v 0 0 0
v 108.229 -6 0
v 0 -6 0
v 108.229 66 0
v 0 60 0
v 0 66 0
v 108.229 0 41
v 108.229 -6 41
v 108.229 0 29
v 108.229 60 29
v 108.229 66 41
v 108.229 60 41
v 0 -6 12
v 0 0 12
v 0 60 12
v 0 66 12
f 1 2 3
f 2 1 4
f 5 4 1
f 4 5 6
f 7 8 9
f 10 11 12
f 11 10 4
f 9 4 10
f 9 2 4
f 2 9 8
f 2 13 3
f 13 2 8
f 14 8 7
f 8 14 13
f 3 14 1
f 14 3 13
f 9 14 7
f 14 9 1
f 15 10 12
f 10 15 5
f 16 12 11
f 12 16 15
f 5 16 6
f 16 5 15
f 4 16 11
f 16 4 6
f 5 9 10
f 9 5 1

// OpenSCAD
// file: rail_spec.scad
// ===== 레일 플랫폼 방식 공용 파라미터 =====
// 핵심 개념: 침대를 들지 않고 굴려서 올라가는 2개의 계량 레일.
//   각 레일 = 알루미늄 프로파일 빔 + 양 끝단 아래 로드셀 2개
//   침대 좌/우 바퀴가 각각 레일 위를 굴러 들어가 크래들에 안착.
//   총 로드셀 4개 = 좌레일 앞/뒤 + 우레일 앞/뒤
//   총중량 = 4개 합 / 무게중심 = 모멘트 계산

// --- 로드셀 CAS BCA-100L ---
L_len=150; L_wid=35; L_thk=40;
L_pitch_x=19; L_pitch_y=15;
L_free_x1=16.5; L_free_x2=35.5;   // 자유단(상면 탭)
L_fix_x1=114.5; L_fix_x2=133.5;   // 고정단(하면 탭)

// --- 스택 높이 ---
PAD_thk    = 6;    // 바닥 패드 두께
SPACER_h   = 5;    // 로드셀 고정단 단상
BRACKET_t  = 6;    // 레일-로드셀 연결 브래킷 두께
RAIL_h     = 30;   // 알루미늄 프로파일 높이 (30x60 사용)
RAIL_w     = 60;   // 프로파일 폭 (바퀴 두께 22mm + 여유)
DECK_Z = PAD_thk + SPACER_h + L_thk + BRACKET_t + RAIL_h;   // = 87

// --- 레일 전체 ---
CASTER_PITCH = 1700;   // 침대 앞뒤 캐스터 간격
RAMP_ANG = 15;
RAMP_len = DECK_Z / tan(RAMP_ANG);      // 약 325mm
RAIL_len = CASTER_PITCH + 400;          // 캐스터간격 + 양끝 여유

// --- 바퀴 ---
wheel_d=60; wheel_thk=22;   // 실측 후 교체
CRADLE_depth = 9;           // 얕은 크래들: 굴러 넘어갈 수 있되 안착은 되게
// main file
// ===== 진입 램프 (분할 출력용) =====
// 전체 램프 길이 약 325mm를 3분할해서 출력 후 이어붙입니다.
// seg = 0(바닥측) / 1(중간) / 2(레일측)
include <rail_spec.scad>
seg = 0;
NSEG = 3;
$fn=32;

seg_len = RAMP_len/NSEG;
lip = 12;                       // 바퀴 이탈 방지 측벽

function h_at(x) = x/RAMP_len*DECK_Z;

module segment(i){
    x0=i*seg_len; x1=(i+1)*seg_len;
    h0=h_at(x0); h1=h_at(x1);
    echo(str("세그먼트 ",i,": 길이 ",seg_len," / 높이 ",h0," -> ",h1));
    union(){
        // 경사 본체
        polyhedron(
          points=[[0,0,0],[seg_len,0,0],[seg_len,RAIL_w,0],[0,RAIL_w,0],
                  [0,0,h0],[seg_len,0,h1],[seg_len,RAIL_w,h1],[0,RAIL_w,h0]],
          faces=[[0,1,2,3],[4,5,1,0],[5,6,2,1],[6,7,3,2],[7,4,0,3],[7,6,5,4]]);
        // 좌우 측벽
        for(y=[-6, RAIL_w])
          translate([0,y,0])
            polyhedron(
              points=[[0,0,0],[seg_len,0,0],[seg_len,6,0],[0,6,0],
                      [0,0,h0+lip],[seg_len,0,h1+lip],[seg_len,6,h1+lip],[0,6,h0+lip]],
              faces=[[0,1,2,3],[4,5,1,0],[5,6,2,1],[6,7,3,2],[7,4,0,3],[7,6,5,4]]);
    }
}
segment(seg);
